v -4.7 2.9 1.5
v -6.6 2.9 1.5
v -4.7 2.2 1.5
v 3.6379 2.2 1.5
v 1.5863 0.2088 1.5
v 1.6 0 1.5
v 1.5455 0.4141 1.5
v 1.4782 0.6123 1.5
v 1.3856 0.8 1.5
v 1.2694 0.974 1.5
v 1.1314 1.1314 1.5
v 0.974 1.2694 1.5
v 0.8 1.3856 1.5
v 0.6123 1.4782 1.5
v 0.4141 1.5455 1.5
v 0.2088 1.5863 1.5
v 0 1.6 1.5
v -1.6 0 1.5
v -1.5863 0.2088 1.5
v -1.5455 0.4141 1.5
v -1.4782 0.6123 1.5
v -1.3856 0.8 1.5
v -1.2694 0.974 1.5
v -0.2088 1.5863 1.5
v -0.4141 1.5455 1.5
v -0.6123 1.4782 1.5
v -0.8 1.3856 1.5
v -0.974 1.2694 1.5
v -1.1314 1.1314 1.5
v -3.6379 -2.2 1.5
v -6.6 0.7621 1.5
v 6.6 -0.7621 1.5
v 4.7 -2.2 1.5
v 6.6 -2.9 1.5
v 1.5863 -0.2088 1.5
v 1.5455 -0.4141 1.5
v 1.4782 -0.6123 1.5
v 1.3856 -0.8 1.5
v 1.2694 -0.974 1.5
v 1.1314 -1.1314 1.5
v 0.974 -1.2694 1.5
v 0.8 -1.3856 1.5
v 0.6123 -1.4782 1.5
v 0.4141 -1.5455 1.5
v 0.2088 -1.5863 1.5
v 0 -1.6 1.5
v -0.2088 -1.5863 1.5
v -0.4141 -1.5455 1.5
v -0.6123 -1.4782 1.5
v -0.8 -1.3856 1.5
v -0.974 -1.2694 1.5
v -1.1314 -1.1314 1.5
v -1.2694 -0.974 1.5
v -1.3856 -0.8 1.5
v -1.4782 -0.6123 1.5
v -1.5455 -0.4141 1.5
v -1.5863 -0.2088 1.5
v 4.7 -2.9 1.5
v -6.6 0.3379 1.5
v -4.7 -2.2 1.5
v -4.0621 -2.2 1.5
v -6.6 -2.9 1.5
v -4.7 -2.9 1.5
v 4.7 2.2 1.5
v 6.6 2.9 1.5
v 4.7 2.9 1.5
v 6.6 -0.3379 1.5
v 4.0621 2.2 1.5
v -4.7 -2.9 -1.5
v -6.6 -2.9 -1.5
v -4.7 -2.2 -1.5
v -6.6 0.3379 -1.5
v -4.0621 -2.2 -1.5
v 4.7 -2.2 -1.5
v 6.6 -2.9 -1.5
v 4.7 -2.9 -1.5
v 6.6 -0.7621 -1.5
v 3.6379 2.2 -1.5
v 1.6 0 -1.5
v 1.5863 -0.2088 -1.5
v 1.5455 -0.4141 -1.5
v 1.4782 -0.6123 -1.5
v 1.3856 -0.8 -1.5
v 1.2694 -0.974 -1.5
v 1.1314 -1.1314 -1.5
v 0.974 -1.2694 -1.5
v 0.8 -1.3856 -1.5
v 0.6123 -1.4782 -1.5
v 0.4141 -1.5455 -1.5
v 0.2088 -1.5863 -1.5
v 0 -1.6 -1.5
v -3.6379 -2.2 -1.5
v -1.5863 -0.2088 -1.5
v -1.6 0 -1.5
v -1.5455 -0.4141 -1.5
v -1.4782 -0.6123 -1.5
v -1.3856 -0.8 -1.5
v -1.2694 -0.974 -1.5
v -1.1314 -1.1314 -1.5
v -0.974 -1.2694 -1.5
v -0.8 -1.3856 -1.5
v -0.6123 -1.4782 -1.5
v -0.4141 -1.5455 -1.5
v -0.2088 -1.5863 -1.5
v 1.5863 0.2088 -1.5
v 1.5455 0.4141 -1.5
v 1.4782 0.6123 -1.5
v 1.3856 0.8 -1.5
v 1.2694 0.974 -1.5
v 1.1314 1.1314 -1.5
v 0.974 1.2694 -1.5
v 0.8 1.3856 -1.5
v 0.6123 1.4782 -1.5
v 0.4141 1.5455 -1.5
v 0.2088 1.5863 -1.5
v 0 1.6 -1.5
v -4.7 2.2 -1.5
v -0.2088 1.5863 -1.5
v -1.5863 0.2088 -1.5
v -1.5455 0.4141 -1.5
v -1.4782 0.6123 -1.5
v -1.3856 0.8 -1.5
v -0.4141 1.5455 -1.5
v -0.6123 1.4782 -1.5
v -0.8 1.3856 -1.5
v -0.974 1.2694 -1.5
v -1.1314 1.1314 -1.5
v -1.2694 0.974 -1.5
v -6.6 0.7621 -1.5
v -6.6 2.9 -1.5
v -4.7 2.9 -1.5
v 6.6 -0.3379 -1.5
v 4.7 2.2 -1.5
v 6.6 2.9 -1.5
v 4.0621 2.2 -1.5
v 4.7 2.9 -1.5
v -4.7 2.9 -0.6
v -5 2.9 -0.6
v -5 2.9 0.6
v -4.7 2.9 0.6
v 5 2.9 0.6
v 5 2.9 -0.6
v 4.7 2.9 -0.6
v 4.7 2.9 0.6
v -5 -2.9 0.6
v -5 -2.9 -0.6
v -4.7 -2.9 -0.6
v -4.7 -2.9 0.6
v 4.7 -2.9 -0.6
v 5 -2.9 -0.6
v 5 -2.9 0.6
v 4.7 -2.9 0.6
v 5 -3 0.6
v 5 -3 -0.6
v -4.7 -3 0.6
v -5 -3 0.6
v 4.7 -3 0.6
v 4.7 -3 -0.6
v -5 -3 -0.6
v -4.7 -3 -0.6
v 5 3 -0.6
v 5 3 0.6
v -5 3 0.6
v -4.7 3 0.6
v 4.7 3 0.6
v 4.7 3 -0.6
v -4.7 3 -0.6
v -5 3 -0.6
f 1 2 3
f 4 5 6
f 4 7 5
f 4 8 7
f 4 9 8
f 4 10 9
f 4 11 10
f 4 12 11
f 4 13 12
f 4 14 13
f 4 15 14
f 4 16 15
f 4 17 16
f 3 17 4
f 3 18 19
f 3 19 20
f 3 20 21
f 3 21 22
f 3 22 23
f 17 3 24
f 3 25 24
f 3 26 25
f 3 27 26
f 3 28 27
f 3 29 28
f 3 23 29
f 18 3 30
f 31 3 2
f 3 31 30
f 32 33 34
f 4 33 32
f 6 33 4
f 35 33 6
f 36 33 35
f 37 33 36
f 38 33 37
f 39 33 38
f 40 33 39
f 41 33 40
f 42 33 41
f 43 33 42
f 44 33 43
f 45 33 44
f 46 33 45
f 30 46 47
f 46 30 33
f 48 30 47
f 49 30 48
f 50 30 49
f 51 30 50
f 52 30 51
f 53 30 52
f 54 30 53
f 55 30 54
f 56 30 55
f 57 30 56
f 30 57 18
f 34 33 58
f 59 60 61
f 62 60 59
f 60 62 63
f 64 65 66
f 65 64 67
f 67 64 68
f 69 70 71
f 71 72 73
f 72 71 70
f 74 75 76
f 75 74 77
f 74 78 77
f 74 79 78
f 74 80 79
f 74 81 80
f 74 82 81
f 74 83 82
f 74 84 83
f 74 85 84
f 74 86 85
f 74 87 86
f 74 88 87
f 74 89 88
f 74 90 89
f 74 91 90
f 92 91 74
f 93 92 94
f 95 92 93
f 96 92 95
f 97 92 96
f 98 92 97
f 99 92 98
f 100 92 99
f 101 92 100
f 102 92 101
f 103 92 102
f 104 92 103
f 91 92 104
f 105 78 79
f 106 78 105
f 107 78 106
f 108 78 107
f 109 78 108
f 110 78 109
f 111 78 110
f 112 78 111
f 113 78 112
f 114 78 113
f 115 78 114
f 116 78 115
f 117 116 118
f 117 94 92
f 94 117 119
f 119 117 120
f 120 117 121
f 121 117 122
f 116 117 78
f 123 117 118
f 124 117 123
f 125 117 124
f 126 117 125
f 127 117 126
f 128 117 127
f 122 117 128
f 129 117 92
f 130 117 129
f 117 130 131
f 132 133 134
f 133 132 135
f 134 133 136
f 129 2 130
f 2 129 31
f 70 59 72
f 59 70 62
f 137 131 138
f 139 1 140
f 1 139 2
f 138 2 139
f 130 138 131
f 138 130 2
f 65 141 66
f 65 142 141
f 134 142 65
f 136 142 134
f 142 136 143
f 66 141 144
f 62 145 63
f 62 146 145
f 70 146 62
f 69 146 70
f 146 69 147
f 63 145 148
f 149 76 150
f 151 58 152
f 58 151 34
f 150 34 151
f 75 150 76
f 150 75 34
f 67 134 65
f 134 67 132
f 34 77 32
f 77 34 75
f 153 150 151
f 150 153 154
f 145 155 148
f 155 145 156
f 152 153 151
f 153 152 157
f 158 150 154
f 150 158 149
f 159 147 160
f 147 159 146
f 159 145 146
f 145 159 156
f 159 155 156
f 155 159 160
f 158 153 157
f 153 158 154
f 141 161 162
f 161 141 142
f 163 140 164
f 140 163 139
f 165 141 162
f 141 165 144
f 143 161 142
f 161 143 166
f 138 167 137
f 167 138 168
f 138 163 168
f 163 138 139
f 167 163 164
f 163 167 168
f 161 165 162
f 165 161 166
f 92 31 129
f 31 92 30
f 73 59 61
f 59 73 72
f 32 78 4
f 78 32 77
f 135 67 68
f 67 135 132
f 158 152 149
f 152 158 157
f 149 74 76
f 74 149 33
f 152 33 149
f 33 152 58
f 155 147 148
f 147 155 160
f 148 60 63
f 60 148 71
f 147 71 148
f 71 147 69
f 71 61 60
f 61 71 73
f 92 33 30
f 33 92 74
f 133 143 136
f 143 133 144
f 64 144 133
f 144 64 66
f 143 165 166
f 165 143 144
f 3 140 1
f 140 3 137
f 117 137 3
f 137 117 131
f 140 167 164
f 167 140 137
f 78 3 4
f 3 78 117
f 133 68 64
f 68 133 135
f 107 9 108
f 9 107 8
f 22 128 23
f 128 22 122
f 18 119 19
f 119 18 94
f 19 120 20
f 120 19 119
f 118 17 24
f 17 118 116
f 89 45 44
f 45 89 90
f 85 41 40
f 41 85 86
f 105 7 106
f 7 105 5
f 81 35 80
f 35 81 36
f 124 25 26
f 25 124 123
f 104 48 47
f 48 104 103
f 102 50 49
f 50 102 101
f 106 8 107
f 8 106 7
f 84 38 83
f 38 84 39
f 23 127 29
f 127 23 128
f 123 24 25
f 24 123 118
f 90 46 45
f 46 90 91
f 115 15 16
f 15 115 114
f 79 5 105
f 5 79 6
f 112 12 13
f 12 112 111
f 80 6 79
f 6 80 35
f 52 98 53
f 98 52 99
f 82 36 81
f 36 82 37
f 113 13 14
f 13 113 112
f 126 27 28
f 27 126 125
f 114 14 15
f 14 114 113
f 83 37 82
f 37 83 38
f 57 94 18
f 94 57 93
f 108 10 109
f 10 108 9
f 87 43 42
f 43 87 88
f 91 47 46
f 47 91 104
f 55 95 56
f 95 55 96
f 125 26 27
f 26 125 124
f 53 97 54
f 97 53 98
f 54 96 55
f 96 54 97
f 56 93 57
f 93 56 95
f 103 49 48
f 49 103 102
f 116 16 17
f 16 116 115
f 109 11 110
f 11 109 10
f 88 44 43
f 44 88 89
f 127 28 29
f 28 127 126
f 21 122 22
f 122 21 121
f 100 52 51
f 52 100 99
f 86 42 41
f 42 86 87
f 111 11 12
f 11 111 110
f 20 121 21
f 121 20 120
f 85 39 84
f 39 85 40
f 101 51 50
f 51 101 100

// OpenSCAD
// T-slot nut for M3 screws, 6.0mm across flats, 3.0mm thick
// Fixed: ensure end blocks are physically connected to the main body (no gaps/floating)

// Parameters
screw_thread_diameter = 3.0;      // M3 nominal
nut_across_flats      = 6.0;      // hex AF
nut_thickness         = 3.0;      // overall thickness (Z)
nut_length            = 10.0;     // along slot (X)

clearance_allowance   = 0.2;      // hole clearance
chamfer_size          = 0.3;      // end chamfer (X)

// Structural overlap for guaranteed connectivity (1-2mm as required)
overlap               = 1.2;      // boolean overlap / intentional intersection

// Simple T-slot features (kept modest so it still fits typical slots)
wing_thickness_y      = 1.2;      // wing thickness (Y)
wing_height_z         = 1.2;      // wing height (Z) (must be <= nut_thickness)
t_slot_channel_lip_width = 2.0;   // relief width near wings (Y)

// Helpers
function hex_circumradius_from_af(af) = af / sqrt(3); // R such that across flats = af

module hex_prism(af, h, center=true) {
    cylinder(r=hex_circumradius_from_af(af), h=h, $fn=6, center=center);
}

module tslot_nut() {

    // Derived sizes to guarantee a single continuous solid along X
    // Main "bar" spans full nut_length; end blocks are attached by overlapping into the bar.
    bar_y = nut_across_flats - 0.2;
    bar_x = nut_length;

    end_block_x = max(2.5, nut_length * 0.28); // modest end blocks (keeps design intent)
    end_block_y = bar_y;
    end_block_z = nut_thickness;

    // Place end blocks so they intersect the bar by 'overlap' (no gaps)
    end_block_center_x = (bar_x/2 + end_block_x/2 - overlap);

    difference() {
        union() {
            // Main body: hex prism (gives visible 6mm across flats)
            hex_prism(nut_across_flats, nut_thickness, center=true);

            // Central sliding bar (continuous connector)
            cube([bar_x, bar_y, nut_thickness], center=true);

            // End blocks (left/right) - ATTACHED by overlapping into the central bar
            for (sx = [-1, 1]) {
                translate([sx * end_block_center_x, 0, 0])
                    cube([end_block_x, end_block_y, end_block_z], center=true);
            }

            // T-slot wings: connected to the body with overlap
            for (sy = [-1, 1]) {
                translate([0,
                           sy * (nut_across_flats/2 + wing_thickness_y/2 - overlap),
                           0])
                    cube([nut_length, wing_thickness_y, min(wing_height_z, nut_thickness)],
                         center=true);
            }
        }

        // End chamfers (lead-in) on the long block portion
        for (sx = [-1, 1]) {
            translate([sx * (nut_length/2 - chamfer_size/2 + overlap), 0, 0])
                rotate([0, 0, 45])
                    cube([chamfer_size,
                          nut_across_flats + 2*(wing_thickness_y) + 2*overlap,
                          nut_thickness + 2*overlap],
                         center=true);
        }

        // Undercut reliefs near wings (helps fit under slot lips)
        for (sy = [-1, 1]) {
            translate([0,
                       sy * (nut_across_flats/2 - t_slot_channel_lip_width/2 + overlap),
                       0])
                cube([nut_length - 2*chamfer_size,
                      t_slot_channel_lip_width,
                      nut_thickness + 2*overlap],
                     center=true);
        }

        // Through hole for M3 screw (clearance)
        cylinder(r=(screw_thread_diameter + clearance_allowance)/2,
                 h=nut_thickness + 2*overlap,
                 center=true,
                 $fn=48);
    }
}

tslot_nut();
